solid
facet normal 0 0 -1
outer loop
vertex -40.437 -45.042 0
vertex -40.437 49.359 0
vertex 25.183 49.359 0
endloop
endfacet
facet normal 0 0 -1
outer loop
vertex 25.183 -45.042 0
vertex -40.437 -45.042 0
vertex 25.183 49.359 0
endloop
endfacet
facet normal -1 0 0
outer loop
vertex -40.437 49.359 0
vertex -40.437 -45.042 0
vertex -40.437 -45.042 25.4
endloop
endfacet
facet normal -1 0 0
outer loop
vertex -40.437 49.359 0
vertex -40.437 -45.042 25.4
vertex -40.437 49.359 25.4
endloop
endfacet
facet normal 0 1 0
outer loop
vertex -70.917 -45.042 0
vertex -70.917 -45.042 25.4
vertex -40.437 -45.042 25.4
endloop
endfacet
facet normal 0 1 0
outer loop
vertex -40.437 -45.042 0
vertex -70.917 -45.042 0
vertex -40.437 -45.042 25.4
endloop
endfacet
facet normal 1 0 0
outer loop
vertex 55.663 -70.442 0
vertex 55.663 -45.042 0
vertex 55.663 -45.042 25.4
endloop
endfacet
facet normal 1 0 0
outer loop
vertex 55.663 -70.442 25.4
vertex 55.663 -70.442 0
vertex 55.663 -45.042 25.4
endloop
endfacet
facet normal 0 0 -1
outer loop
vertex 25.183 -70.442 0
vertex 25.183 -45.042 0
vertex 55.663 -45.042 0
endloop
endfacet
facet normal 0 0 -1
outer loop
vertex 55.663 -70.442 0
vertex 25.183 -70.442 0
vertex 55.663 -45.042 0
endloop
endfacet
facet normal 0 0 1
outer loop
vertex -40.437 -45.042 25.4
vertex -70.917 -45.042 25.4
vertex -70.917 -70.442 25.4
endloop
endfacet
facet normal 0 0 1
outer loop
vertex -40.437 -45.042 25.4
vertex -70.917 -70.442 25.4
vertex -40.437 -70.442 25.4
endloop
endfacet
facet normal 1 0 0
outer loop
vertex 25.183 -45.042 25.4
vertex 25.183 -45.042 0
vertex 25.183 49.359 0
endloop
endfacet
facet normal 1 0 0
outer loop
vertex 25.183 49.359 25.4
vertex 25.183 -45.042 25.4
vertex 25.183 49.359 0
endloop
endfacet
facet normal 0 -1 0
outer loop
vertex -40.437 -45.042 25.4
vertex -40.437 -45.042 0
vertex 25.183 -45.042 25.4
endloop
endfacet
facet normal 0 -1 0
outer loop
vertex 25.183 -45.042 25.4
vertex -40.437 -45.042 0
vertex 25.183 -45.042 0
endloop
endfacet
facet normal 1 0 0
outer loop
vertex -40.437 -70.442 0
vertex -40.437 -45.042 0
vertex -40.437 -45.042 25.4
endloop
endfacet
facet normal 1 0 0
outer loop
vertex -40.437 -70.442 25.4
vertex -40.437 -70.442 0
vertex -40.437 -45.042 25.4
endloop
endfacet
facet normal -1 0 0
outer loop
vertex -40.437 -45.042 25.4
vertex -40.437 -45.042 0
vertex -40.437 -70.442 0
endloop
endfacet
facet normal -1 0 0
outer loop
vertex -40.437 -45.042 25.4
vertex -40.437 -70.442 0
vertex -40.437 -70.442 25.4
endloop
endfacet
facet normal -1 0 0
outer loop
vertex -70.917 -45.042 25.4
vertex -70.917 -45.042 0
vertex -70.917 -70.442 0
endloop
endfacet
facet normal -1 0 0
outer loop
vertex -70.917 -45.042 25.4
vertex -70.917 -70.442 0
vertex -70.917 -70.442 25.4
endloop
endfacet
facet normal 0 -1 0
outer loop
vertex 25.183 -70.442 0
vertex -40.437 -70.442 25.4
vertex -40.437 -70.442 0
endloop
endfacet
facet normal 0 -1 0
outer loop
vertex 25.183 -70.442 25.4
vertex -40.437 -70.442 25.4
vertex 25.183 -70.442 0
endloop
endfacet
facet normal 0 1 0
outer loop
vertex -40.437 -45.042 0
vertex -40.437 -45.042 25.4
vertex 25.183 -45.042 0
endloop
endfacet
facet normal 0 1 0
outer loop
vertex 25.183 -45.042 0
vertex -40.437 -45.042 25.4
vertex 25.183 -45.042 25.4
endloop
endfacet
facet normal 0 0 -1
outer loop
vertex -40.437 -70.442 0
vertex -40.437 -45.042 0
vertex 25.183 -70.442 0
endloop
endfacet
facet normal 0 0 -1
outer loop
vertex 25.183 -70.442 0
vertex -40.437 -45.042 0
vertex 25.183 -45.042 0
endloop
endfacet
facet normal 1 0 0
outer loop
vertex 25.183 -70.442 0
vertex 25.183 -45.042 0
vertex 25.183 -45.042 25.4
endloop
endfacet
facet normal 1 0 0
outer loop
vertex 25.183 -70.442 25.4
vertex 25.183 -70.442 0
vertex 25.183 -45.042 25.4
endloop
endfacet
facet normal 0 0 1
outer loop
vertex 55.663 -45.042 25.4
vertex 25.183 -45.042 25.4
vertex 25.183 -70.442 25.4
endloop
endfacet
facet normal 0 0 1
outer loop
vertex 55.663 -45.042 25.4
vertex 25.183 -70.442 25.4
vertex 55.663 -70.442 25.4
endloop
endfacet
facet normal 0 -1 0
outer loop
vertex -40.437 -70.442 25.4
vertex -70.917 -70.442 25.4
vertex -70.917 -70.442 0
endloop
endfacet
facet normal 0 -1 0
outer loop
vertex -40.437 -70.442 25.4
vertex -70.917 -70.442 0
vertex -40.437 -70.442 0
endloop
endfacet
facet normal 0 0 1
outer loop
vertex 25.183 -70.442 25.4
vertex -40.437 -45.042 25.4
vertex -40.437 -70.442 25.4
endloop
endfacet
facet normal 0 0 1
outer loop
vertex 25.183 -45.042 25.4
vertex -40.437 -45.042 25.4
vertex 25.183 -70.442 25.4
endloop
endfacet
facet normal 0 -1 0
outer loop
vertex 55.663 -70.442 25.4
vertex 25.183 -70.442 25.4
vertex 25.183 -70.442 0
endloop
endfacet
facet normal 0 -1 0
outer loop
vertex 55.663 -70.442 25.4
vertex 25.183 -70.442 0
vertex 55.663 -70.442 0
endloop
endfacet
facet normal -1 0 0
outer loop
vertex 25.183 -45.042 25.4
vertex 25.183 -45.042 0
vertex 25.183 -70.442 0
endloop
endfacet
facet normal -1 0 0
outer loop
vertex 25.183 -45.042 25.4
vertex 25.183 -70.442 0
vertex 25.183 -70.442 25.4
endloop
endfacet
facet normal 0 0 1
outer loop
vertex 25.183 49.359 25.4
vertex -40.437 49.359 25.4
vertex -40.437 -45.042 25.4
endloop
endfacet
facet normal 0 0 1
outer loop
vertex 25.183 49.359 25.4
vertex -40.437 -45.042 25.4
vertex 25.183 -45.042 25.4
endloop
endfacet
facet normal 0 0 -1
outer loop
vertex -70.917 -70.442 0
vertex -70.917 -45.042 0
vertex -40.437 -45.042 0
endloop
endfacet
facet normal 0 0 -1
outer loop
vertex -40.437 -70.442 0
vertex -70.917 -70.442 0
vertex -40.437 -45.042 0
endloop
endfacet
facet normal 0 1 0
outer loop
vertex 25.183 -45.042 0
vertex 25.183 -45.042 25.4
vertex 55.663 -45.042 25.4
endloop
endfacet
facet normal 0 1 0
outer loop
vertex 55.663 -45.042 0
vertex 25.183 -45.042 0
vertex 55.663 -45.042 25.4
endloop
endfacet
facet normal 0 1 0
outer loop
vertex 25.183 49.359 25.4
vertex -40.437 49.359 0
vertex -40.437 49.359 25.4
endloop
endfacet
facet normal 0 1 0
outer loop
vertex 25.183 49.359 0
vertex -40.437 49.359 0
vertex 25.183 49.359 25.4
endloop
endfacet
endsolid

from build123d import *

# Parameters (mm, degrees)
F0_W     = 65.61971
F0_H     = 94.40029
F1_DEPTH = 25.4
F2_W     = 30.48
F2_H     = 25.4
F3_DEPTH = 25.4
F4_W     = 65.61971
F4_H     = 25.4
F5_DEPTH = 25.4


with BuildPart() as f1:
    # F0 (on Top) → F1 (new body)
    with BuildSketch(Plane.XY):
        with Locations((-7.626852, 2.158543)):
            Rectangle(F0_W, F0_H)
    extrude(amount=F1_DEPTH)


with BuildPart() as f3:
    # F2 (on face) → F3 (new body)
    with BuildSketch(Plane.XZ.offset(45.041602)):
        with Locations((-55.676707, 12.7)):
            Rectangle(F2_W, F2_H)
        with Locations((40.423003, 12.7)):
            Rectangle(F2_W, F2_H)
    extrude(amount=F3_DEPTH)


with BuildPart() as f5:
    # F4 (on face) → F5 (new body)
    with BuildSketch(Plane.XZ.offset(45.041602)):
        with Locations((-7.626852, 12.7)):
            Rectangle(F4_W, F4_H)
    extrude(amount=F5_DEPTH)


solid = Compound([f1.part, f3.part, f5.part])
